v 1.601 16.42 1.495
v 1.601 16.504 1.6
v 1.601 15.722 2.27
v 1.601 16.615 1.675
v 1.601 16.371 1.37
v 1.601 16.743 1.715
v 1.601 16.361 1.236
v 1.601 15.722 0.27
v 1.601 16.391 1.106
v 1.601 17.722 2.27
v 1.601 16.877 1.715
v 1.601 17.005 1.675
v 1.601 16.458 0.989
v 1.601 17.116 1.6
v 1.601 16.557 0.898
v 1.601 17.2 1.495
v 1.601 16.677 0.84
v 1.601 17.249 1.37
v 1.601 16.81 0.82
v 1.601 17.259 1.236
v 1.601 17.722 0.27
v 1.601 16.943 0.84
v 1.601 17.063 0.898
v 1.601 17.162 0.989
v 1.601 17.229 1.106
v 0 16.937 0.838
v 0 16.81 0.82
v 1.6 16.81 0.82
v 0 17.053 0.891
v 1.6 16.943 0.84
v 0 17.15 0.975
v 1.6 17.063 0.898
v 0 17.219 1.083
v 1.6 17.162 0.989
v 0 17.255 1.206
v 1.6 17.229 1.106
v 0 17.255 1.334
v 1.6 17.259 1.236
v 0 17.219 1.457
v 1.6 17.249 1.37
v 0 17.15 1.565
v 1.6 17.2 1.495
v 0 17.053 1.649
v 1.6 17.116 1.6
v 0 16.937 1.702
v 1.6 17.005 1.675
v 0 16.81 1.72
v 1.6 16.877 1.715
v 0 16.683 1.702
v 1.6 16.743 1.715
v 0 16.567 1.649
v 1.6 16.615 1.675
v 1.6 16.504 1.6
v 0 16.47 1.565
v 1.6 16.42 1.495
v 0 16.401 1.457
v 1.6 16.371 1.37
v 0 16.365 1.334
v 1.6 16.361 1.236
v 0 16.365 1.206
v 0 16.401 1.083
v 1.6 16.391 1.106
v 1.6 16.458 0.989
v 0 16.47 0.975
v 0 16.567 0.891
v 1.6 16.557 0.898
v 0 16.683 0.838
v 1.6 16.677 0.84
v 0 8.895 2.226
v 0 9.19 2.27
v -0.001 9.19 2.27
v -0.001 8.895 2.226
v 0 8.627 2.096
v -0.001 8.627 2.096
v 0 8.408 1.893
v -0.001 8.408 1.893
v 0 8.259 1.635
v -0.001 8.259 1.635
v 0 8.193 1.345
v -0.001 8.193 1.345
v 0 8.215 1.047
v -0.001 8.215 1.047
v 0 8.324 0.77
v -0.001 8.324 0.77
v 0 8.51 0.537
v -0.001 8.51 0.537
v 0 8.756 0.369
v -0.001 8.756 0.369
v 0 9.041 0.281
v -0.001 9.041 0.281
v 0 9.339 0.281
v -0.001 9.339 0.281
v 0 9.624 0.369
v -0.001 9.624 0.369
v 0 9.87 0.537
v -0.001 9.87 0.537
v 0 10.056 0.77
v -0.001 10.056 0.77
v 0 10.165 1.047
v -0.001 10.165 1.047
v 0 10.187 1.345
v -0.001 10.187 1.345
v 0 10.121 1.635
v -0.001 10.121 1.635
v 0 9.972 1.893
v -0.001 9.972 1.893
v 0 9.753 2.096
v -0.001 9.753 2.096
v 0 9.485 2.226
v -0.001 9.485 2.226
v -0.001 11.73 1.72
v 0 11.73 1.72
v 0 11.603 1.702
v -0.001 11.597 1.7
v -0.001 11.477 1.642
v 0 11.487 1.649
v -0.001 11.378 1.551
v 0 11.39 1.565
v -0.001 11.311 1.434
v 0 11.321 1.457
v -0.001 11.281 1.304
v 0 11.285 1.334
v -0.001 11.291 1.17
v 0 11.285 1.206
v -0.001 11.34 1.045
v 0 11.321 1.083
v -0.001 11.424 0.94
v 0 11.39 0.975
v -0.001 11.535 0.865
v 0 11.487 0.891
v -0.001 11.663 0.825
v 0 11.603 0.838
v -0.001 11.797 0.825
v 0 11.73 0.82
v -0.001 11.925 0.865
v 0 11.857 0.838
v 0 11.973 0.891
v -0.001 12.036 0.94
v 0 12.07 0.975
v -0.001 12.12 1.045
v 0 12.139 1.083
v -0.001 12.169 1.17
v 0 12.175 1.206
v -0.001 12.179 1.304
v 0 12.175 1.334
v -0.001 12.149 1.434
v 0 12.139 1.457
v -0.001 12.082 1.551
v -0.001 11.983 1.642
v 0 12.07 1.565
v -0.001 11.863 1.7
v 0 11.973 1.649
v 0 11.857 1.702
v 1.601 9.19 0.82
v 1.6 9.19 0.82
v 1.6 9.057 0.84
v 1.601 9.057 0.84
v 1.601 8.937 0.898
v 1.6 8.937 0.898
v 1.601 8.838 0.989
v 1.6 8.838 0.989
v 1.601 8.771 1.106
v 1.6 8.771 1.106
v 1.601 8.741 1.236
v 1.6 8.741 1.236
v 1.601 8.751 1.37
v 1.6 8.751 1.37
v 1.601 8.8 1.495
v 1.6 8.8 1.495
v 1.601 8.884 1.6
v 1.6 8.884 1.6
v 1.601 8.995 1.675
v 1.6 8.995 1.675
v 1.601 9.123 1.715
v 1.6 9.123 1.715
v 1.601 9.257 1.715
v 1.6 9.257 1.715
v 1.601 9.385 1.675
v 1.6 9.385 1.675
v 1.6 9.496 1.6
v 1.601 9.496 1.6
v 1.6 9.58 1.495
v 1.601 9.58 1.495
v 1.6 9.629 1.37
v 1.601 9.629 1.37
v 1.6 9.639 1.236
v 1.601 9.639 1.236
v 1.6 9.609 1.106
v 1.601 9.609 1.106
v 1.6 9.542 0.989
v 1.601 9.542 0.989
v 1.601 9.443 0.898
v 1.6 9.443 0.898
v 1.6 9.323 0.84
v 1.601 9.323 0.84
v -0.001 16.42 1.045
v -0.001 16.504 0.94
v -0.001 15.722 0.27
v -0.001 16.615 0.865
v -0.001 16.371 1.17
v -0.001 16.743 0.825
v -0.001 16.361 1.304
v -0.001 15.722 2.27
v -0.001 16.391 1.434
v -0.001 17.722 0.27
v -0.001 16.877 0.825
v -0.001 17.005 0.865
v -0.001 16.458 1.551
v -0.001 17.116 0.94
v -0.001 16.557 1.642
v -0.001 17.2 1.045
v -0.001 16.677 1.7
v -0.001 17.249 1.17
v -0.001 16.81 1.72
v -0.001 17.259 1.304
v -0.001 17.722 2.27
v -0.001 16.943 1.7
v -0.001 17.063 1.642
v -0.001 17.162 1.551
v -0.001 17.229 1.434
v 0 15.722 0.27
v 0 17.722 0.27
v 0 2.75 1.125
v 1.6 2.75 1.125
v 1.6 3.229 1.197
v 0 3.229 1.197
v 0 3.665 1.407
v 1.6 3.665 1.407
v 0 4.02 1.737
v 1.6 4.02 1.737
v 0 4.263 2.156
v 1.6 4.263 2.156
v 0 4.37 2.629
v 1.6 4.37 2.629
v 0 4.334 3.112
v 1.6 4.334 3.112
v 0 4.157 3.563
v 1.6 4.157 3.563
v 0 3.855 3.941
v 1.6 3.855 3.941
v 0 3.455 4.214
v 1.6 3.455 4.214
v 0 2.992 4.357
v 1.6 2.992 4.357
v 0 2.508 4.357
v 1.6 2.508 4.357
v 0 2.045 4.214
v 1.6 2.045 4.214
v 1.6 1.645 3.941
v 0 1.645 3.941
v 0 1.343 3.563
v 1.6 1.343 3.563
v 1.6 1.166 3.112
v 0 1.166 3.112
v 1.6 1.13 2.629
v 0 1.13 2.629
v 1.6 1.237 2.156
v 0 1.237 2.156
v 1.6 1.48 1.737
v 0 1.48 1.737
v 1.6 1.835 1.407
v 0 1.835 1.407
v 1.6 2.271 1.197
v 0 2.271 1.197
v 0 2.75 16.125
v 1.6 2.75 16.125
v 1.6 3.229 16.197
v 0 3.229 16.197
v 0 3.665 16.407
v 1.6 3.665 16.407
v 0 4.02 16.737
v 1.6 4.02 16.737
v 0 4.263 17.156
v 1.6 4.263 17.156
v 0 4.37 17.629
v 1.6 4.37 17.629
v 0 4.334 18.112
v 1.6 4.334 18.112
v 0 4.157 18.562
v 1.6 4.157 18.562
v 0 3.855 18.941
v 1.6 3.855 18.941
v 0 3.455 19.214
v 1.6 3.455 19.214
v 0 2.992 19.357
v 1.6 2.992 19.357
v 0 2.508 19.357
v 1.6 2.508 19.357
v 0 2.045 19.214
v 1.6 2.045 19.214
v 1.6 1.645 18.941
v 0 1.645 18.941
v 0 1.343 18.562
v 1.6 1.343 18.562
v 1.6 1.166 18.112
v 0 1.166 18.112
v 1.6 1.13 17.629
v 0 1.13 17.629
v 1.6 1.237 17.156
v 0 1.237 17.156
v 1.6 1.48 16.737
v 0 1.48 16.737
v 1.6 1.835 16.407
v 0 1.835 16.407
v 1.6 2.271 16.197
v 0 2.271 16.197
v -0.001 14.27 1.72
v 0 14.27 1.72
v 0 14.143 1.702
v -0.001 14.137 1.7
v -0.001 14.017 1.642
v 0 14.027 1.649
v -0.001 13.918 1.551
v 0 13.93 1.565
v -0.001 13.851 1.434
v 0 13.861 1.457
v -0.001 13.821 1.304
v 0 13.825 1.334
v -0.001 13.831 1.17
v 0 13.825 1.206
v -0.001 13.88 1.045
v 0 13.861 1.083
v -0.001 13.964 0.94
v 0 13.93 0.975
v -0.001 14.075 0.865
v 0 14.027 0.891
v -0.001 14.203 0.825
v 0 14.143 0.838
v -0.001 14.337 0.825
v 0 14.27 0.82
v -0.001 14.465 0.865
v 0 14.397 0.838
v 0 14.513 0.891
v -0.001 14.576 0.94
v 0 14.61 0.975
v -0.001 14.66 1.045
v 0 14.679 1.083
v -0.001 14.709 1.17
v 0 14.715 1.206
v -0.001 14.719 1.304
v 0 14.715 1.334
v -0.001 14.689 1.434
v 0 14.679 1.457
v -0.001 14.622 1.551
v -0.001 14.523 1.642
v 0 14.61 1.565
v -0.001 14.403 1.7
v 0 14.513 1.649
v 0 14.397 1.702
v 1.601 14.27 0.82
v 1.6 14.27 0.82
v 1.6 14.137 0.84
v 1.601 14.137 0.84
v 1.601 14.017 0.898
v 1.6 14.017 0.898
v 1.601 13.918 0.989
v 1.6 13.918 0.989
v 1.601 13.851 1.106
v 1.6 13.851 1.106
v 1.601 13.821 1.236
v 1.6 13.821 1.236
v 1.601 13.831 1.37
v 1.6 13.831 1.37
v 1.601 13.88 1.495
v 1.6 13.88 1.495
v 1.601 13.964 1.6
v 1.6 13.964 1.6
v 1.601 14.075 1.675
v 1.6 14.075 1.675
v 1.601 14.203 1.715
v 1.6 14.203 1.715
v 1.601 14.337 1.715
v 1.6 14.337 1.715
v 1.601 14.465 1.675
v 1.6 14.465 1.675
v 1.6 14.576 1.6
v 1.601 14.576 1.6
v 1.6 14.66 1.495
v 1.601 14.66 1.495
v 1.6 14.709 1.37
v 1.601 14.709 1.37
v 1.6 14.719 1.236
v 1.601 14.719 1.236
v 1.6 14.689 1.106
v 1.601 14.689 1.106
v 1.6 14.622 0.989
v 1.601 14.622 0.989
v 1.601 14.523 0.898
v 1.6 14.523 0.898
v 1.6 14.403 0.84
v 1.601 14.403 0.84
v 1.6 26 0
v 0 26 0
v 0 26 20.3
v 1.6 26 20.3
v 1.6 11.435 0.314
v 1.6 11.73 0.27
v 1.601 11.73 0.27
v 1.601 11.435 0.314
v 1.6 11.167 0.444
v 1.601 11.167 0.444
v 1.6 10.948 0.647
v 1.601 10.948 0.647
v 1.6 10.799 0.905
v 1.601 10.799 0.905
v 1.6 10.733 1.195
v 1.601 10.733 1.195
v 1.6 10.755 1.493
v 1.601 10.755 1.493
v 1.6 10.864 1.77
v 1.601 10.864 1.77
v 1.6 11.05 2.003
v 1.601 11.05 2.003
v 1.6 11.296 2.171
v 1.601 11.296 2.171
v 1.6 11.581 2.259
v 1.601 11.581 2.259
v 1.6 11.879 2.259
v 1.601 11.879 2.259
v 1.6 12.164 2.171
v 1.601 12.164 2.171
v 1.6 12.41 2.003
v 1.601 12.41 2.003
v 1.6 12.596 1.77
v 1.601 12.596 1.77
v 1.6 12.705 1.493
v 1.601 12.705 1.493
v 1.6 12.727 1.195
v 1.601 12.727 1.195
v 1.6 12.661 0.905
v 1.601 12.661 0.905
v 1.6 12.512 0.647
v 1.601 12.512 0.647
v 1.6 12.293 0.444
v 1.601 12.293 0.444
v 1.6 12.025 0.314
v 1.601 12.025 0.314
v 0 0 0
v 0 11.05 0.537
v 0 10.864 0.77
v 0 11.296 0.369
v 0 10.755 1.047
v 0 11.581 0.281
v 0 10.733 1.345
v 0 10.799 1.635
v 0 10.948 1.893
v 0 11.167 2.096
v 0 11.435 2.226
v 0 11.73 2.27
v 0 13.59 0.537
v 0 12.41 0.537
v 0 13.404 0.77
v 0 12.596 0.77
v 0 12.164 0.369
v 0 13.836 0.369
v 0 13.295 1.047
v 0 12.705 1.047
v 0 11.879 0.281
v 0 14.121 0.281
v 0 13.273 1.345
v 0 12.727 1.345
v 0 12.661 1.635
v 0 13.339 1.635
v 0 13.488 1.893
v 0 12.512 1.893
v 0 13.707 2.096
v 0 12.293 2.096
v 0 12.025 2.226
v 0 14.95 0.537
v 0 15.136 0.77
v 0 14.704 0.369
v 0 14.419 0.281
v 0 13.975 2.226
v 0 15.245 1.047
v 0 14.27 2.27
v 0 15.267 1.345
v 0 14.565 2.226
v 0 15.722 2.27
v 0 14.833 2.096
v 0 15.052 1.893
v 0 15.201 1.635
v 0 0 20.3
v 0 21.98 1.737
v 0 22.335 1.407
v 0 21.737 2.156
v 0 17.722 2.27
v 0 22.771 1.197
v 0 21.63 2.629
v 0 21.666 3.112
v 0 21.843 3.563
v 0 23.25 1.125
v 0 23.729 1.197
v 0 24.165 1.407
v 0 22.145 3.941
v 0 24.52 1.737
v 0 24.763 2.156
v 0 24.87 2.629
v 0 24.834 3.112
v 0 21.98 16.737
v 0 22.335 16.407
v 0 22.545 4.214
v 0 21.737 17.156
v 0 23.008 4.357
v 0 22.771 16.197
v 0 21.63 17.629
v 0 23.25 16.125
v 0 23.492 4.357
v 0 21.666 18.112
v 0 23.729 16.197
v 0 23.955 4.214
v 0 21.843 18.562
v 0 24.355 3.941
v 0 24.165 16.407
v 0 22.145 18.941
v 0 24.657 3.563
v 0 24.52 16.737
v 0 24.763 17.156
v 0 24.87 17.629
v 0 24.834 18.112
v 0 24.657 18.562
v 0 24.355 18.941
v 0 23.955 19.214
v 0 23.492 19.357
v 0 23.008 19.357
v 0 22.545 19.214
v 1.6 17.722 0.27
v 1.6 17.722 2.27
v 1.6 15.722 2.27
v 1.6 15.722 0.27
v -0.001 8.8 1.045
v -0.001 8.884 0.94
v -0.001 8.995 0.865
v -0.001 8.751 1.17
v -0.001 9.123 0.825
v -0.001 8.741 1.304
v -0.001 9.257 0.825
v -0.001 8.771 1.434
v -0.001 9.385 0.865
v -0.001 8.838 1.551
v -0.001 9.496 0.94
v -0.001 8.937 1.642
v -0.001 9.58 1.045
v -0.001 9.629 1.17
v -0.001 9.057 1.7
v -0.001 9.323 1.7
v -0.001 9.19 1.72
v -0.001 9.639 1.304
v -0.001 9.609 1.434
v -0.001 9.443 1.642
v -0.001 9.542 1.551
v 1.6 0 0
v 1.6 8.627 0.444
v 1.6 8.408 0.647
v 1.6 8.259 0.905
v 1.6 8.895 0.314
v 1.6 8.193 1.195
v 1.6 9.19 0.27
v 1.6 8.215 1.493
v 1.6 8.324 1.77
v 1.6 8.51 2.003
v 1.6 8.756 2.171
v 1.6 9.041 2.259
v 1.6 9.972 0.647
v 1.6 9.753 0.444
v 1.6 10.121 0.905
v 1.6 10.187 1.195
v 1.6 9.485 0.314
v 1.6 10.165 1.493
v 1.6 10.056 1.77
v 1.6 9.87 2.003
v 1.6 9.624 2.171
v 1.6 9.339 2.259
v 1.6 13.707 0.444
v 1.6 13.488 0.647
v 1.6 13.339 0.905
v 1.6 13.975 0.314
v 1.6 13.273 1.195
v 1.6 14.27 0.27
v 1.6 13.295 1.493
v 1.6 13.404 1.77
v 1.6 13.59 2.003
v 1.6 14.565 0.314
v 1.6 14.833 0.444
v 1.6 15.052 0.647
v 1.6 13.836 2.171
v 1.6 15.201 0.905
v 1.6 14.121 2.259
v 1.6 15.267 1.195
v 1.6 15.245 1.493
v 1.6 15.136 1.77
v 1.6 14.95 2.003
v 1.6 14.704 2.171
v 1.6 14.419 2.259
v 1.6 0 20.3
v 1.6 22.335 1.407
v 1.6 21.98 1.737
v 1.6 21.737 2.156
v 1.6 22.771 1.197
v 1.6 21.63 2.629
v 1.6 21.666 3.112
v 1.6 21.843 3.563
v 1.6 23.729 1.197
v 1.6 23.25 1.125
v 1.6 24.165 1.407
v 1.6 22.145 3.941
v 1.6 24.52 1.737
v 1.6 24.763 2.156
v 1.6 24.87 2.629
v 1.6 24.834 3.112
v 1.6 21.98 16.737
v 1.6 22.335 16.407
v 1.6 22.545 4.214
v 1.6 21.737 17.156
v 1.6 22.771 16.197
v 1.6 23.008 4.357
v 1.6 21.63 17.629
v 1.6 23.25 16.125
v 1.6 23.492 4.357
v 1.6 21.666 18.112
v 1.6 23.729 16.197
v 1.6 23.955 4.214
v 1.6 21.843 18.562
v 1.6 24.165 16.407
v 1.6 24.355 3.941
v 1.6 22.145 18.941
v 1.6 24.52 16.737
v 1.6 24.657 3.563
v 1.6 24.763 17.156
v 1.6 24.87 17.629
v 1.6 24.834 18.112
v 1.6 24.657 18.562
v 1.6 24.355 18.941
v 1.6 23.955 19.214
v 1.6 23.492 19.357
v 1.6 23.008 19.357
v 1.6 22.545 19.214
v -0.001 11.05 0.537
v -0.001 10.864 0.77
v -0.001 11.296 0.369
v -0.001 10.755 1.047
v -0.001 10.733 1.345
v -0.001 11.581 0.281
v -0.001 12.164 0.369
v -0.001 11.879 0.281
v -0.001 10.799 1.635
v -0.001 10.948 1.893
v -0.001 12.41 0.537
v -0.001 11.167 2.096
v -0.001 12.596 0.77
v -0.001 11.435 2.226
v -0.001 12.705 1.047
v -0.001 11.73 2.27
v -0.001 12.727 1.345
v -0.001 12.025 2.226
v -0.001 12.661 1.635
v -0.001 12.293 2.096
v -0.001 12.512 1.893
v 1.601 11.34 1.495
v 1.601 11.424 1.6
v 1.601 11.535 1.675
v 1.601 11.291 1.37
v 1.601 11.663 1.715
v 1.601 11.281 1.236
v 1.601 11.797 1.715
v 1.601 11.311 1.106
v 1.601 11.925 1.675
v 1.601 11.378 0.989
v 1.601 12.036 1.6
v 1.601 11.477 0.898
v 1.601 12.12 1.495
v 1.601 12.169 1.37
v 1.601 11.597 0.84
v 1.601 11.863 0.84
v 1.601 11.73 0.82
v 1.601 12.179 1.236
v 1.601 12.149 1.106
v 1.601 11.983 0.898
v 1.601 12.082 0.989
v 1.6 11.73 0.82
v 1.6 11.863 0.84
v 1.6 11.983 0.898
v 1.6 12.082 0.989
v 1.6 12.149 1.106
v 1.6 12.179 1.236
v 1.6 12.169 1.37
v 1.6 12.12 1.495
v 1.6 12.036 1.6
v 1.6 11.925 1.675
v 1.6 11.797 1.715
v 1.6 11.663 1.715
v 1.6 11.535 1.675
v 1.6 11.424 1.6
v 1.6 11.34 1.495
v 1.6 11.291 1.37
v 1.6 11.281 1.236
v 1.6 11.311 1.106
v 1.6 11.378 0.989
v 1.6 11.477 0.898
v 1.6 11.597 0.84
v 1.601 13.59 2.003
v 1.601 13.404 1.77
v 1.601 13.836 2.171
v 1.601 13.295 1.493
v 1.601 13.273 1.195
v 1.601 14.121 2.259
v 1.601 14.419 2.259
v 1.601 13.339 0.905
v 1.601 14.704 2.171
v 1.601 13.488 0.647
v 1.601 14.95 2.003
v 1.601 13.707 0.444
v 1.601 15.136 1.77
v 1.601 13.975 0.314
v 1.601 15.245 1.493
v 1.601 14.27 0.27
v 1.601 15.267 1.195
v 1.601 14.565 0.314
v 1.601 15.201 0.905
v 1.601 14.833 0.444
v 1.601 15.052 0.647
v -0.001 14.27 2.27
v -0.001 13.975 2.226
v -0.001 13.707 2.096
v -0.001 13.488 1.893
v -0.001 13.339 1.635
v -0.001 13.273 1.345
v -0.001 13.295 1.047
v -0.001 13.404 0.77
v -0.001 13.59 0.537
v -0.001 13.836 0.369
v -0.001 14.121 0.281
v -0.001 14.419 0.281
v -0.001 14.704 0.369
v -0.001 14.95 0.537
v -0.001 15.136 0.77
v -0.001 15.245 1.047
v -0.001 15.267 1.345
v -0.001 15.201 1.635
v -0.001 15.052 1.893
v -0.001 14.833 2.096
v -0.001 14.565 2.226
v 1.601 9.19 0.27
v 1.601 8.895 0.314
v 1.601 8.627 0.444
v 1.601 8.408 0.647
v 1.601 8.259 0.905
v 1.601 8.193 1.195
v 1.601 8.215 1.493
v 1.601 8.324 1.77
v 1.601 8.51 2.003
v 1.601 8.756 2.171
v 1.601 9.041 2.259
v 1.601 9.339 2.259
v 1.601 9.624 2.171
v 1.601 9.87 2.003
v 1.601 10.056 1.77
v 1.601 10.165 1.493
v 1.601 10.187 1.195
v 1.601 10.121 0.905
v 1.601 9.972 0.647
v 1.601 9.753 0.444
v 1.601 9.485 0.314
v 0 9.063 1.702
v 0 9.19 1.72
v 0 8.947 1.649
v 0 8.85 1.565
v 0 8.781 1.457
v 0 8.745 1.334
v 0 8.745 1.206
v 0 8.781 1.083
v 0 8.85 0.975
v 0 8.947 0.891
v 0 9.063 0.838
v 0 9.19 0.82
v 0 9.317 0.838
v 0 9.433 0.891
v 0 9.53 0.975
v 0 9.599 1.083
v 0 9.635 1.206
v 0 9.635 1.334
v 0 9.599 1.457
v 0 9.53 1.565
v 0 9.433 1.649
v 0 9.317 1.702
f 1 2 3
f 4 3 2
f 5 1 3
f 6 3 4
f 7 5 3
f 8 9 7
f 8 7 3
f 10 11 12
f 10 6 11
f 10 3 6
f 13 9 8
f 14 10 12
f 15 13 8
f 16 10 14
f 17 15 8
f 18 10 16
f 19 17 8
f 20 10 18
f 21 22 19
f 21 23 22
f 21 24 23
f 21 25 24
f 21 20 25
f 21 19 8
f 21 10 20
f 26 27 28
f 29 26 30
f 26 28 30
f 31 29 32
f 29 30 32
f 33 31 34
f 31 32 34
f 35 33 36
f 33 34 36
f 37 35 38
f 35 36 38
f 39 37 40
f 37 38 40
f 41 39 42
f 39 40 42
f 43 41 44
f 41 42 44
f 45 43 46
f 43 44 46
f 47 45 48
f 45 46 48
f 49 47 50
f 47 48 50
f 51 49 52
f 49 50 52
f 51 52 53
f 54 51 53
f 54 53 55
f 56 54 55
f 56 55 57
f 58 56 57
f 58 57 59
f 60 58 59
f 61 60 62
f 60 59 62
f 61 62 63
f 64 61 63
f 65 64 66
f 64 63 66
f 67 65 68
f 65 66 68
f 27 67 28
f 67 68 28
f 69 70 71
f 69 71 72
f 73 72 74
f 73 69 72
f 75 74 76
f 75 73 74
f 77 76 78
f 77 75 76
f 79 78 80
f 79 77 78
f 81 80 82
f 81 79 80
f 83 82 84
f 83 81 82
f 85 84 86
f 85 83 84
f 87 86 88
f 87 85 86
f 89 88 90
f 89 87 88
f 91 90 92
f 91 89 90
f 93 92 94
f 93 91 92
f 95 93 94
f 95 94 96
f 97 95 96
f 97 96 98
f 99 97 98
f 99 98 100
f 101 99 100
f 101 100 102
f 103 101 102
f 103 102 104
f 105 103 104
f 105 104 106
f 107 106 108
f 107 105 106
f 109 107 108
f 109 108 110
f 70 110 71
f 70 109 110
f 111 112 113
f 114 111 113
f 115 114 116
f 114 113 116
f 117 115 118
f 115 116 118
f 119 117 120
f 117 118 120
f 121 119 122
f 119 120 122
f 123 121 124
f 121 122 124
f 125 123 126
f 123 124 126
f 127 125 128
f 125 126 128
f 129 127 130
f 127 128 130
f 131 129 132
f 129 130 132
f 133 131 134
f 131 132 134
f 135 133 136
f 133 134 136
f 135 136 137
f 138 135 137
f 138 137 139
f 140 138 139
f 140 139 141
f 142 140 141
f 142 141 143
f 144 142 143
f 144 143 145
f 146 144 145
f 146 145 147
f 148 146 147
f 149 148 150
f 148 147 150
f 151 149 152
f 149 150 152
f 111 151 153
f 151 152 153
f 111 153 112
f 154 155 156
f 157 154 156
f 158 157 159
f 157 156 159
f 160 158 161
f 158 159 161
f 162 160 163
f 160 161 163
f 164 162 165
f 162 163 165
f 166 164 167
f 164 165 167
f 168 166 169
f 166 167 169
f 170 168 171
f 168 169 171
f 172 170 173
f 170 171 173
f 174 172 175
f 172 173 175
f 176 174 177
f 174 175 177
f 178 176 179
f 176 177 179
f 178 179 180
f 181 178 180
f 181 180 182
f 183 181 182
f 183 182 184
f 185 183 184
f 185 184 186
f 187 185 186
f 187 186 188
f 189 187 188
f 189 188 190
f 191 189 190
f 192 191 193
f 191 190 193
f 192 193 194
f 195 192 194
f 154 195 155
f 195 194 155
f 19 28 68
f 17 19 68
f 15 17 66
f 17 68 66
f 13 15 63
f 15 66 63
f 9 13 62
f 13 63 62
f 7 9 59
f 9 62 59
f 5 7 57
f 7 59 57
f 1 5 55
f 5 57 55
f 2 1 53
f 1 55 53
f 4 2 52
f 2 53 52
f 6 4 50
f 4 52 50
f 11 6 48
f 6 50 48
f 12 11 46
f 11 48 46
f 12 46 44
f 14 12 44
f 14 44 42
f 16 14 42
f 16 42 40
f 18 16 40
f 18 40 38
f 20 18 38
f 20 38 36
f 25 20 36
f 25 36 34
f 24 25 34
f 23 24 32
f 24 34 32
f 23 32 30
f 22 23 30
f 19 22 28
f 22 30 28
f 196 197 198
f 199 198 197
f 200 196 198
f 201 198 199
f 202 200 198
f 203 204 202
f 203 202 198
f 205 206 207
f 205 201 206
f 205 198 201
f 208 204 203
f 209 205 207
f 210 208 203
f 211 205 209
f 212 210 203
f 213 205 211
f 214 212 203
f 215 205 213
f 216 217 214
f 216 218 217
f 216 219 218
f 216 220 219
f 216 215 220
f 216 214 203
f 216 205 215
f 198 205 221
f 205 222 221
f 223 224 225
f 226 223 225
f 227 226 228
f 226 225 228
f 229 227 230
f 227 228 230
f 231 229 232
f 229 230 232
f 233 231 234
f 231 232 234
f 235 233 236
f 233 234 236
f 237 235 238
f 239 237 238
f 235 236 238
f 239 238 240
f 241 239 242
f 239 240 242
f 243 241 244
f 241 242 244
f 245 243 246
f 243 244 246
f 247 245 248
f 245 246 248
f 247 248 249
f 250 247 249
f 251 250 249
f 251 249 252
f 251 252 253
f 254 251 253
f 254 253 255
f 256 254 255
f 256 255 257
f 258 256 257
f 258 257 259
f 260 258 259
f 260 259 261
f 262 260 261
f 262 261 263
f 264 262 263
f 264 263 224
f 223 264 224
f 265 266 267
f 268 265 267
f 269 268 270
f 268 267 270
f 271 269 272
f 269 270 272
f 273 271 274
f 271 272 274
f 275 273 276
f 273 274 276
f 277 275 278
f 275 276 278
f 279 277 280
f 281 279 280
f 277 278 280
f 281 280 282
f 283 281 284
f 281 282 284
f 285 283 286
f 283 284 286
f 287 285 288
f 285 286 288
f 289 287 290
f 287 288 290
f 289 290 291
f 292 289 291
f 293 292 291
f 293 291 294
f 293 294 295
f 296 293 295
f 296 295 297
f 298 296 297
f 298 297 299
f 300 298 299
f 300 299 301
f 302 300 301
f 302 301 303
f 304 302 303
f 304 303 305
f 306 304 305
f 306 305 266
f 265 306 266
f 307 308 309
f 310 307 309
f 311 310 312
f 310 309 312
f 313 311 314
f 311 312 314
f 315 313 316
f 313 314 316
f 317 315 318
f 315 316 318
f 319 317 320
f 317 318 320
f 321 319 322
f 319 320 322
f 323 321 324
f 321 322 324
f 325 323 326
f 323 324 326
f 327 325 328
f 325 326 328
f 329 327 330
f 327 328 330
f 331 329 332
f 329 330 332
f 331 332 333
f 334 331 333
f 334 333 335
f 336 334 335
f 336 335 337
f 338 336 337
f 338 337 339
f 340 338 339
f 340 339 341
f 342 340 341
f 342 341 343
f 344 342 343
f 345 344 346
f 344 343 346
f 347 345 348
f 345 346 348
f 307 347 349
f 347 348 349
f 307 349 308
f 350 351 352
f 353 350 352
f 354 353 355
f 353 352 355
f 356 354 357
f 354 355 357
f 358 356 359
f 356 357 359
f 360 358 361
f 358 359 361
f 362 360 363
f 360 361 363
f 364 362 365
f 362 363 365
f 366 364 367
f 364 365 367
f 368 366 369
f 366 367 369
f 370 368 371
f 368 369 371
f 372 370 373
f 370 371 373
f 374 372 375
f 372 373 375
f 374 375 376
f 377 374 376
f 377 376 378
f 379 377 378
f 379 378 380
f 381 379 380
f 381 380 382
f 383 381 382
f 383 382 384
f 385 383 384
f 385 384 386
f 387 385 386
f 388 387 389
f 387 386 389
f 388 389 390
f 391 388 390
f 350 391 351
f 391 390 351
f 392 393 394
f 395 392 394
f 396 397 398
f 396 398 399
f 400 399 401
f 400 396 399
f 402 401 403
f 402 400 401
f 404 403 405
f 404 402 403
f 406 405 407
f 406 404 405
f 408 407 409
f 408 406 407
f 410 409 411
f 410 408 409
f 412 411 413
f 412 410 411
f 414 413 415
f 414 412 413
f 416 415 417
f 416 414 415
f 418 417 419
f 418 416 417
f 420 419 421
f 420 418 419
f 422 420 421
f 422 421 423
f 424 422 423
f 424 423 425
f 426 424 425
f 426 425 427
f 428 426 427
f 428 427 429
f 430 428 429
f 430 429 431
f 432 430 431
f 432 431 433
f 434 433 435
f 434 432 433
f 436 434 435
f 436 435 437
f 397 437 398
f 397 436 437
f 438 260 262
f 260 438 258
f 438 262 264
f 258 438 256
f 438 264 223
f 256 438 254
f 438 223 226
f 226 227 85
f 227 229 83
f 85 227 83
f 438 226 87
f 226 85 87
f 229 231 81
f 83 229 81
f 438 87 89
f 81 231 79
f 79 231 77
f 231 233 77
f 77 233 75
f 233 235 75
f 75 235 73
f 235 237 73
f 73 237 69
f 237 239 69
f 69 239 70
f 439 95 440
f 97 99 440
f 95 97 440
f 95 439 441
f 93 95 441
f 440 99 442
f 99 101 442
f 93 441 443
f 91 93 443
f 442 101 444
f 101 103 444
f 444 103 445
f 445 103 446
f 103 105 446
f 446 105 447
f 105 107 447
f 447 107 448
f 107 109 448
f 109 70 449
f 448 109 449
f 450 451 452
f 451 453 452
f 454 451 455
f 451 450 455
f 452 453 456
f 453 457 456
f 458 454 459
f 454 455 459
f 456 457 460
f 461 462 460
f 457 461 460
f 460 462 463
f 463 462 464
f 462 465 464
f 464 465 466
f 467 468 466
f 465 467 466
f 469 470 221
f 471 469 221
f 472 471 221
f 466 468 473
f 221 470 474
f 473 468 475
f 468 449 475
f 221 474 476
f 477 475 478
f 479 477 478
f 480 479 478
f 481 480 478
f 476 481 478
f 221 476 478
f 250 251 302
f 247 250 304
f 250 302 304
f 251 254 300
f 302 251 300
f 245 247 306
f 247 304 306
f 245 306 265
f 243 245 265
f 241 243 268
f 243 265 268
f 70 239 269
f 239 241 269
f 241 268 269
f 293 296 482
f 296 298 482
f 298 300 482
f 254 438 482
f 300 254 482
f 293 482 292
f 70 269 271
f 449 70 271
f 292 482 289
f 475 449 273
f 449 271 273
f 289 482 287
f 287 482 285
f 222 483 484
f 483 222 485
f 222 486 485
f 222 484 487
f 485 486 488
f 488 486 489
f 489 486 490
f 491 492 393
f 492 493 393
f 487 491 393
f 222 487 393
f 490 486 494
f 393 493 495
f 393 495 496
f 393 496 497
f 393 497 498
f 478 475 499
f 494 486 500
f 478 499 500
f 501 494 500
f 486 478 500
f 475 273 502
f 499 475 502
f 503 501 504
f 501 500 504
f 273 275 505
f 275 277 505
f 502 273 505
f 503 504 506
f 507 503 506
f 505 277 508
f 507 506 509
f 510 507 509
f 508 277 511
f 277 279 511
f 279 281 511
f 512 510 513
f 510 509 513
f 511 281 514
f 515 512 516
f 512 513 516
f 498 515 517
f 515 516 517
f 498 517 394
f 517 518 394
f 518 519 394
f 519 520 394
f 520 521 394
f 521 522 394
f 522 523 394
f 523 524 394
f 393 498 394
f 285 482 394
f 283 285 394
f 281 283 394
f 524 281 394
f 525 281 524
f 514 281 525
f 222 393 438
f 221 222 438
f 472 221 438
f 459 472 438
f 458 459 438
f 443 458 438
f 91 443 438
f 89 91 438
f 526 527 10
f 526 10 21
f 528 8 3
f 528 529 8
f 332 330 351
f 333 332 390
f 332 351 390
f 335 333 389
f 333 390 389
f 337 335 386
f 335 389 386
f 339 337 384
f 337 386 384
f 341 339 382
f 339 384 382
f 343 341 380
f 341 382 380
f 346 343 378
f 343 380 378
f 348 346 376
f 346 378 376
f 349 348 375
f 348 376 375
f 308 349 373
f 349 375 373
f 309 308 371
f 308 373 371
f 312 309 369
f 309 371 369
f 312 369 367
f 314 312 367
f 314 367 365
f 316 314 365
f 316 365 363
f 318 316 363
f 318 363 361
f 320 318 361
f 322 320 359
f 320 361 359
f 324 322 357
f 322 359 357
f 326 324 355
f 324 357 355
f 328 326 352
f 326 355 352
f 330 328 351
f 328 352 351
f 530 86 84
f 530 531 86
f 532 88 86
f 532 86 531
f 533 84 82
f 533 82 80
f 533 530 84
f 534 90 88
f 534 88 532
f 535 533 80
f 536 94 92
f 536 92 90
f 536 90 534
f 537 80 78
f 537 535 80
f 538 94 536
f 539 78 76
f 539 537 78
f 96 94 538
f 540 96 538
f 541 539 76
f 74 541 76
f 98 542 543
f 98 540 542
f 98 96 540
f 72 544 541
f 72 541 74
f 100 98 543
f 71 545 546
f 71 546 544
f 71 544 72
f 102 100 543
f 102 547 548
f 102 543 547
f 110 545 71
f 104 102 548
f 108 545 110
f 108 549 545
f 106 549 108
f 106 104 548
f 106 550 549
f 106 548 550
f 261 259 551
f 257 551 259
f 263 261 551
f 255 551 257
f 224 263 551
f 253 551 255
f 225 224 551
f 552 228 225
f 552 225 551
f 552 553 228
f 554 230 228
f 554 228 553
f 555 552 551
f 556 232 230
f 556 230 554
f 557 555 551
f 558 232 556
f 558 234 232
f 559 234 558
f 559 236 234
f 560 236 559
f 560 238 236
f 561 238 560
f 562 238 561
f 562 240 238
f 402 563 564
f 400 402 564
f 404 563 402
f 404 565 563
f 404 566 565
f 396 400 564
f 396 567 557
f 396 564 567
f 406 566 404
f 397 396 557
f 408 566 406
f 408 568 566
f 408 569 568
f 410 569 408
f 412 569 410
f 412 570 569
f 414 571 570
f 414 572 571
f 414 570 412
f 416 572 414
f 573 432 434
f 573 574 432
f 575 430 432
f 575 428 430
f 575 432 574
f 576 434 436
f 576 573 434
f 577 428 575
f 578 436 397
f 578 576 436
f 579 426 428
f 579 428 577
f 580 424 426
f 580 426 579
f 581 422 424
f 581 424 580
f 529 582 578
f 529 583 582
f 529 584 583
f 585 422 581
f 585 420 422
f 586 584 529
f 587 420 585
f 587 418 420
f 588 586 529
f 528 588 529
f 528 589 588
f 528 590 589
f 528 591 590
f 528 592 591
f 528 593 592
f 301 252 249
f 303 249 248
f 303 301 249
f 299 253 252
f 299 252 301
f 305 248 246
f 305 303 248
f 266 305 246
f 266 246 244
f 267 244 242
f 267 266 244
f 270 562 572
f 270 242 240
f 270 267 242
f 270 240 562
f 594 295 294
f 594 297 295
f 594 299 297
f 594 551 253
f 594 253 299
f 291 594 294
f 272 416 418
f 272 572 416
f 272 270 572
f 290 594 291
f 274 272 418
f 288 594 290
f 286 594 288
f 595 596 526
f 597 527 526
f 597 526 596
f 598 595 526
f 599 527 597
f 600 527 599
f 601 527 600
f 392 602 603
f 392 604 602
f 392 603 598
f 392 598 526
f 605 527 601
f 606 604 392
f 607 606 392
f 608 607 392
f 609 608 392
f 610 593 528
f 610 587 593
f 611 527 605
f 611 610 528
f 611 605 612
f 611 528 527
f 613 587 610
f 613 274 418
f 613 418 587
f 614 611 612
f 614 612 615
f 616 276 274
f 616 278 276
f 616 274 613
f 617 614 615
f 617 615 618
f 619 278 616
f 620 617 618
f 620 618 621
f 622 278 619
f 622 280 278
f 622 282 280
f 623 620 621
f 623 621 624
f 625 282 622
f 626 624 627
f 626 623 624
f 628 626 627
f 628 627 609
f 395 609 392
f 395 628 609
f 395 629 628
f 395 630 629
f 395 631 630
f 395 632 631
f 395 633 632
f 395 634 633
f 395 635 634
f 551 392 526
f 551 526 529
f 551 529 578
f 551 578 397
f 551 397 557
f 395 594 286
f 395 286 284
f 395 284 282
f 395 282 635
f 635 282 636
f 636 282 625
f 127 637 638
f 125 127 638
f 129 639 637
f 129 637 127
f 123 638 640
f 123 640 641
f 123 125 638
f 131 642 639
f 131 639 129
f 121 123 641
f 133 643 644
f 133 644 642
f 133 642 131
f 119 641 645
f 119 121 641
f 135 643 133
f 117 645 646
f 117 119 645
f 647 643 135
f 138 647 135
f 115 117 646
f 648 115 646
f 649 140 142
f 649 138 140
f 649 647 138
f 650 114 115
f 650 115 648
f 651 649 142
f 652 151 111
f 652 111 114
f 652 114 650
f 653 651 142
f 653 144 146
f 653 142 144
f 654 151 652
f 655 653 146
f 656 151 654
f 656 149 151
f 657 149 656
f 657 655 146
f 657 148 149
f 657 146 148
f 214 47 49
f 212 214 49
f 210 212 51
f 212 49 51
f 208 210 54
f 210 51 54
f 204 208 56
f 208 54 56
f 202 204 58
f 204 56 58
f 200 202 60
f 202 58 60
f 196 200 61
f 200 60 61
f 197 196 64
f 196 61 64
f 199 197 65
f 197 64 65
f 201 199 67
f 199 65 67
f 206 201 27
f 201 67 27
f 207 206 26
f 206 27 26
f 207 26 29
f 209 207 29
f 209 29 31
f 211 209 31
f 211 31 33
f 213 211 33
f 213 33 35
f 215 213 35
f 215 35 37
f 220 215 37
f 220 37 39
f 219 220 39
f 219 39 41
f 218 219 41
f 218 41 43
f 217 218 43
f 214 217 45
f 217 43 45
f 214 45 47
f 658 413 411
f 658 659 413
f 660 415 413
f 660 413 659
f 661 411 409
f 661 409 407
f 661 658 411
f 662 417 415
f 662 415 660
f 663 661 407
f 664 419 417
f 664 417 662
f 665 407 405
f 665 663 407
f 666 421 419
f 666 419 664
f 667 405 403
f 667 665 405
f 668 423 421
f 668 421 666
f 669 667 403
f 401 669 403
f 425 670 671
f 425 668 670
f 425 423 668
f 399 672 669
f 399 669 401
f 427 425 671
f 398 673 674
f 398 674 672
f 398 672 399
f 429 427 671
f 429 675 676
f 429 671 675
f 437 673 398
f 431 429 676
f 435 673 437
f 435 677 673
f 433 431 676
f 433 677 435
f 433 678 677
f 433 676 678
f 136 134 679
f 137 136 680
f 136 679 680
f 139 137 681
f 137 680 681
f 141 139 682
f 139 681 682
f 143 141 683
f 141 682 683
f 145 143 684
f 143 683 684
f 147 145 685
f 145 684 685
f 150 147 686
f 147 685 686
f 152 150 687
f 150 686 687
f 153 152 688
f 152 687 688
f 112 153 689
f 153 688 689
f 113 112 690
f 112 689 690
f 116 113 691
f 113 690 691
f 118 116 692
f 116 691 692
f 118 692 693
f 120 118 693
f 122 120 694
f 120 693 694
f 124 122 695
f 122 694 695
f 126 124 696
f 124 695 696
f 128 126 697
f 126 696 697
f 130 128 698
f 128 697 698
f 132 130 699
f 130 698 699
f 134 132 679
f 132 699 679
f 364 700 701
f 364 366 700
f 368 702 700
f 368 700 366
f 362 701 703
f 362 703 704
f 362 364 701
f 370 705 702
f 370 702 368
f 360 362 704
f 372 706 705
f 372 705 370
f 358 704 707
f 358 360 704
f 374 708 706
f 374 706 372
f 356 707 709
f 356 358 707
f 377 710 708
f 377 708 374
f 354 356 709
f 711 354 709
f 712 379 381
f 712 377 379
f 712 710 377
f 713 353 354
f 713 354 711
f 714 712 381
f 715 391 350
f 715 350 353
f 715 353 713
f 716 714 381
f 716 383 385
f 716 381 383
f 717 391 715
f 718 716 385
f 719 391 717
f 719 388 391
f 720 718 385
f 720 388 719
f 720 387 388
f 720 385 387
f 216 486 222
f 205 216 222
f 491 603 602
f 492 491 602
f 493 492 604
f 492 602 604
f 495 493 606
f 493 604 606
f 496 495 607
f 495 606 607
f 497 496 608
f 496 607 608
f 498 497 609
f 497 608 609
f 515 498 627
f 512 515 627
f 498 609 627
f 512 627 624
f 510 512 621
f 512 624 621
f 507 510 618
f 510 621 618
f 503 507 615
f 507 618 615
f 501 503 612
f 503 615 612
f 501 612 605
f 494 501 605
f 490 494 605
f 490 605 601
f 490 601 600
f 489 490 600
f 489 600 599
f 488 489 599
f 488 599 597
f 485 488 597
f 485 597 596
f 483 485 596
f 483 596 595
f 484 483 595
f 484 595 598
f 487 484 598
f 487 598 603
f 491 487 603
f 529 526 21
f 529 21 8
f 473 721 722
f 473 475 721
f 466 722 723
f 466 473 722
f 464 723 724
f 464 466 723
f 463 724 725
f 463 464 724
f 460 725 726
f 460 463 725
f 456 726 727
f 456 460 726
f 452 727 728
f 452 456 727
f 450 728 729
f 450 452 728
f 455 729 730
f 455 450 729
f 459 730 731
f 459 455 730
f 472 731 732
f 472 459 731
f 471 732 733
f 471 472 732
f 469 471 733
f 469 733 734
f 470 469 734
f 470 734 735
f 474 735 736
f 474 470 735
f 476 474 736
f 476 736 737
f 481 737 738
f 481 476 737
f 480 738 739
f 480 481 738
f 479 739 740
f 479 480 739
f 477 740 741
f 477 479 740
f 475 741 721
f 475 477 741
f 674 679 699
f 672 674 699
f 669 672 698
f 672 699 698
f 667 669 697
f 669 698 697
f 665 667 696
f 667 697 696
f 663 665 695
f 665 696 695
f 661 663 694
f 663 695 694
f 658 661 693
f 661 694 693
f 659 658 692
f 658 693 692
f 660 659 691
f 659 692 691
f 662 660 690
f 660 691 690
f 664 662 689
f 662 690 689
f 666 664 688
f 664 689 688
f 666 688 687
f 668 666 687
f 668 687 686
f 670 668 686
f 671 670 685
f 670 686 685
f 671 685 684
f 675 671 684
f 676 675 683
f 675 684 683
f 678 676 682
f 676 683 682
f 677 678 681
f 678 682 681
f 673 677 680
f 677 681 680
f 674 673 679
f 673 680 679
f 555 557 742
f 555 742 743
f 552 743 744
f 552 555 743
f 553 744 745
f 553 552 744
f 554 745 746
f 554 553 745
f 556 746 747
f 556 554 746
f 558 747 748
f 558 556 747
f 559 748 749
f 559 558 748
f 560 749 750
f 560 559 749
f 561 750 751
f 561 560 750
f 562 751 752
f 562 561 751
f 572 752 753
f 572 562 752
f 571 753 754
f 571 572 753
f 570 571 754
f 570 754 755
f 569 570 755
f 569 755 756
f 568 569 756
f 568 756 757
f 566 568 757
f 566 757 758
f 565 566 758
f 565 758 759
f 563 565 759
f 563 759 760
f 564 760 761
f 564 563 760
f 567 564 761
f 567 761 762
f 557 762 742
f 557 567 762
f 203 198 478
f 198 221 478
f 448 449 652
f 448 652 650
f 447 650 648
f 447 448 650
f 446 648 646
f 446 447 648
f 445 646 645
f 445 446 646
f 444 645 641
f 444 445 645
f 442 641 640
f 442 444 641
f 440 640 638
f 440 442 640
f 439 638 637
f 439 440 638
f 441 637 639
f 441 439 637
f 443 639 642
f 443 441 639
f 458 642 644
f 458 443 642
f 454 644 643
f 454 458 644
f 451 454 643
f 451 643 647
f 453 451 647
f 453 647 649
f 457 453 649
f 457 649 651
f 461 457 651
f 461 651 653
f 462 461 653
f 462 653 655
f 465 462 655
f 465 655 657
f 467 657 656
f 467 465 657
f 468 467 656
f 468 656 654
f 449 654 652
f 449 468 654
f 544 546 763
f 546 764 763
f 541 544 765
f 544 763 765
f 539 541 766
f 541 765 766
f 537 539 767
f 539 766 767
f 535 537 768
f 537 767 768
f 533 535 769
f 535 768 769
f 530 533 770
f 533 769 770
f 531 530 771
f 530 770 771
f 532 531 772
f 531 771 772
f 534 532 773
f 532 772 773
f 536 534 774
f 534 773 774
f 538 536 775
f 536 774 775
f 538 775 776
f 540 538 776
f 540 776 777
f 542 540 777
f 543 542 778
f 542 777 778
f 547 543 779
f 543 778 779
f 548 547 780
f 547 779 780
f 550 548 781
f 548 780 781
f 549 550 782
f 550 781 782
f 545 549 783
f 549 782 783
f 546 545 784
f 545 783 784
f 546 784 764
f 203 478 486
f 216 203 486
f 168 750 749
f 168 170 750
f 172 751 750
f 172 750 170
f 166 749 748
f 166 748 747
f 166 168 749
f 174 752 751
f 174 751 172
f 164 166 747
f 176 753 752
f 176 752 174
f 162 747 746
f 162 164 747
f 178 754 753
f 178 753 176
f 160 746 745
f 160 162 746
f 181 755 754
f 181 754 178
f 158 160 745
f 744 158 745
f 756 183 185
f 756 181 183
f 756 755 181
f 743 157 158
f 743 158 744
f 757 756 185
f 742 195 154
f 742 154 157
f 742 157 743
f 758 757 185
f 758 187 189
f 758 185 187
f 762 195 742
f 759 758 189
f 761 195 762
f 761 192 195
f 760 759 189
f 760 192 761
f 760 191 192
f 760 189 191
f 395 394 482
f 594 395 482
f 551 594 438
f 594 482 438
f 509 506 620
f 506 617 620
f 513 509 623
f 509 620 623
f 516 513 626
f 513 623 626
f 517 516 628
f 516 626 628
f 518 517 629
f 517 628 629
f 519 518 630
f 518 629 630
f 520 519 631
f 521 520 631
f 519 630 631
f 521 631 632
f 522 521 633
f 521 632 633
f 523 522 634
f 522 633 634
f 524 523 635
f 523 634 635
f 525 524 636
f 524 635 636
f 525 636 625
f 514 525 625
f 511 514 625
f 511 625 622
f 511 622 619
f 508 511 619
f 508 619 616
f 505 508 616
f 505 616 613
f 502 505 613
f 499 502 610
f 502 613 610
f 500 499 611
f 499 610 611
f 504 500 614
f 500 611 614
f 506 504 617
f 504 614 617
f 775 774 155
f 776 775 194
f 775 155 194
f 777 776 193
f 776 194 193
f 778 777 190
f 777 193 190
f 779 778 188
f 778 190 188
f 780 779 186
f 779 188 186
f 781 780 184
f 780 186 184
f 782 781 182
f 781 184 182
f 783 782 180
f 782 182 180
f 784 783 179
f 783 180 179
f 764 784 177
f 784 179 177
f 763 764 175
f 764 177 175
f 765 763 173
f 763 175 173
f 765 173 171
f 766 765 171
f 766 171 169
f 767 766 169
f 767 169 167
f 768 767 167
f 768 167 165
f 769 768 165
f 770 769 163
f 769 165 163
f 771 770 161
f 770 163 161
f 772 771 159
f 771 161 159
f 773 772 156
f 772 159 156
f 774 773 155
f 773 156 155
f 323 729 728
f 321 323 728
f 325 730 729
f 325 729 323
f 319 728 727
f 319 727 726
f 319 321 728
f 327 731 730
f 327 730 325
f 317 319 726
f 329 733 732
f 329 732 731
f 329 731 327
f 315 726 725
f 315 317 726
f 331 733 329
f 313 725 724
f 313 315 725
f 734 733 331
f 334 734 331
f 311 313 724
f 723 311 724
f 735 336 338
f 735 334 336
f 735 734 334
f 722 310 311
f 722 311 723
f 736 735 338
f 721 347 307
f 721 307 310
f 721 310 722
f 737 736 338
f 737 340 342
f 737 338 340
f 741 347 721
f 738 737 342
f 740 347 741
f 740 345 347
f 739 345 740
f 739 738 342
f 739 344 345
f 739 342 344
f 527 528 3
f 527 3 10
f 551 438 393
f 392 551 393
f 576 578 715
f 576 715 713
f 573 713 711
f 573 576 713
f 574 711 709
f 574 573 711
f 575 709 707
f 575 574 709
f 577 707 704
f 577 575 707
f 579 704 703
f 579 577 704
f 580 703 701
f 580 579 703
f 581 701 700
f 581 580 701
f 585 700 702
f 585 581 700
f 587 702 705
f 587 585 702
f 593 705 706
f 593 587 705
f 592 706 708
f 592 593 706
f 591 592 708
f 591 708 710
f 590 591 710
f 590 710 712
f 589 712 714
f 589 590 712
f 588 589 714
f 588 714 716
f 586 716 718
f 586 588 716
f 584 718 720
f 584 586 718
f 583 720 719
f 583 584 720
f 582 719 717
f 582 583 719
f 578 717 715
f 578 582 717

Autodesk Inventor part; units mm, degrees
ref_plane "YZ Plane" through (0, 0, 0) normal (1, 0, 0) x (0, 1, 0)
ref_plane "XZ Plane" through (0, 0, 0) normal (0, 1, 0) x (-1, 0, 0)
ref_plane "XY Plane" through (0, 0, 0) normal (0, 0, 1) x (1, 0, 0)
sketch "Náčrt1" plane through (0, 0, 0) normal (1, 0, 0) x (0, 1, 0)
  line L0 (0, 0) -> (26, 0)
  line L1 (26, 0) -> (26, 20.3)
  line L2 (26, 20.3) -> (0, 20.3)
  line L3 (0, 20.3) -> (0, 0)
  dimension "d0" = 26
  dimension "d1" = 20.3
extrude "Vysunutí1" add sketch "Náčrt1" along normal blind 1.6
sketch "Náčrt2" plane through (1.6, 0, 0) normal (1, 0, 0) x (0, 0, -1)
  line L0 (0, 0) -> (0, 26) projected
  line L1 (-20.3, 0) -> (0, 0) projected
  circle A0 centre (-2.75, 23.25) radius 1.625
  circle A1 centre (-2.75, 2.75) radius 1.625
  circle A2 centre (-1.27, 16.81) radius 0.45
  circle A3 centre (-1.27, 14.27) radius 0.45
  circle A4 centre (-1.27, 11.73) radius 0.45
  circle A5 centre (-1.27, 9.19) radius 0.45
  circle A6 centre (-17.75, 23.25) radius 1.625
  circle A7 centre (-17.75, 2.75) radius 1.625
  dimension "d4" = 20.5
  dimension "d6" = 3.25
  dimension "d7" = 2.75
  dimension "d8" = 2.75
  dimension "d9" = 2.75
  dimension "d10" = 0.9
  dimension "d11" = 1.27
  dimension "d12" = 2.54
  dimension "d13" = 2.54
  dimension "d14" = 2.54
  dimension "d15" = 1.27
  dimension "d16" = 1.27
  dimension "d17" = 1.27
  dimension "d18" = 7.62
  dimension "d19" = 6.44
  dimension "d20" = 20.5
  dimension "d21" = 2.75
  dimension "d25" = 15
  dimension "d26" = 15
extrude "Vysunutí3" cut sketch "Náčrt2" against normal through all
sketch "Náčrt3" plane through (1.6, 0, 0) normal (1, 0, 0) x (0, 0, -1)
  circle A0 centre (-1.27, 11.73) radius 0.45 projected
  circle A1 centre (-1.27, 16.81) radius 0.45 projected
  circle A2 centre (-1.27, 14.27) radius 0.45 projected
  circle A3 centre (-1.27, 9.19) radius 0.45 projected
  line L0 (-2.27, 17.7223) -> (-0.27, 17.7223)
  line L1 (-0.27, 17.7223) -> (-0.27, 15.7223)
  line L2 (-0.27, 15.7223) -> (-2.27, 15.7223)
  line L3 (-2.27, 15.7223) -> (-2.27, 17.7223)
  circle A4 centre (-1.27, 14.27) radius 1
  circle A5 centre (-1.27, 11.73) radius 1
  circle A6 centre (-1.27, 9.19) radius 1
  dimension "d31" = 2
  dimension "d33" = 1
  dimension "d34" = 2
  dimension "d35" = 1.0877
  dimension "d36" = 2
extrude "Vysunutí4" add sketch "Náčrt3" along normal blind 0.001
sketch "Náčrt4" plane through (0, 0, 0) normal (-1, 0, 0) x (0, 0, 1)
  circle A0 centre (1.27, 11.73) radius 0.45 projected
  circle A1 centre (1.27, 16.81) radius 0.45 projected
  circle A2 centre (1.27, 14.27) radius 0.45 projected
  circle A3 centre (1.27, 9.19) radius 0.45 projected
  line L0 (2.27, 17.7223) -> (0.27, 17.7223) projected
  line L1 (2.27, 15.7223) -> (2.27, 17.7223) projected
  line L2 (0.27, 15.7223) -> (2.27, 15.7223) projected
  line L3 (0.27, 17.7223) -> (0.27, 15.7223) projected
  circle A4 centre (1.27, 14.27) radius 1 projected
  circle A5 centre (1.27, 11.73) radius 1 projected
  circle A6 centre (1.27, 9.19) radius 1 projected
extrude "Vysunutí5" add sketch "Náčrt4" along normal blind 0.001
sketch "Náčrt5" plane through (1.6, 0, 0) normal (1, 0, 0) x (0, 0, -1)
  line L0 (-12.9507, 18.458) -> (-3.259, 18.458) construction
  line L1 (-3.259, 18.458) -> (-3.259, 7.2075) construction
  line L2 (-3.259, 7.2075) -> (-12.9507, 7.2075) construction
  line L3 (-12.9507, 7.2075) -> (-12.9507, 18.458) construction
sketch "Náčrt6" plane through (0, 0, 0) normal (-1, 0, 0) x (0, 0, 1)
  line L0 (2.7892, 18.5709) -> (6.1278, 18.5709) construction
  line L1 (6.1278, 18.5709) -> (6.1278, 7.3401) construction
  line L2 (6.1278, 7.3401) -> (2.7892, 7.3401) construction
  line L3 (2.7892, 7.3401) -> (2.7892, 18.5709) construction
  line L4 (9.218, 26) -> (9.218, 0) construction
  line L5 (9.218, 0) -> (6.7421, 0) construction
  line L6 (6.7421, 0) -> (6.7421, 26) construction
  line L7 (6.7421, 26) -> (9.218, 26) construction
  line L8 (18.8, 26) -> (18.8, 0) construction
  line L9 (18.8, 0) -> (16.2512, 0) construction
  line L10 (16.2512, 0) -> (16.2512, 26) construction
  line L11 (16.2512, 26) -> (18.8, 26) construction
equation "\"d7\" = -0.5 * d4 + 0.5 * d0"
equation "\"d8\" = d7"
equation "\"d9\" = d7"
equation "\"d15\" = d11"
equation "\"d16\" = d11"
equation "\"d17\" = d11"
equation "\"d19\" = -0.5 * d18 + 0.5 * d4"
equation "\"d20\" = d4"
equation "\"d21\" = d7"
equation "\"d26\" = d25"
equation "\"PoloměrOhybu\" = Tloušťka"
equation "\"ŠířkaVýštipu\" = Tloušťka"
equation "\"HloubkaVýštipu\" = 0.5 * Tloušťka"
equation "\"VelikostRohovéhoVýštipu\" = 4 * Tloušťka"
equation "\"MinimálníZbytek\" = 2 * Tloušťka"
equation "\"PřechodovýPoloměr\" = PoloměrOhybu"
equation "\"VelikostJacobihoPoloměru\" = Tloušťka"
equation "\"VelikostMezery\" = Tloušťka"
equation "\"Tloušťka\" = 0.5"
properties part number "SparkFun USB Type A Female Breakout - doska" material "ABS plast"
